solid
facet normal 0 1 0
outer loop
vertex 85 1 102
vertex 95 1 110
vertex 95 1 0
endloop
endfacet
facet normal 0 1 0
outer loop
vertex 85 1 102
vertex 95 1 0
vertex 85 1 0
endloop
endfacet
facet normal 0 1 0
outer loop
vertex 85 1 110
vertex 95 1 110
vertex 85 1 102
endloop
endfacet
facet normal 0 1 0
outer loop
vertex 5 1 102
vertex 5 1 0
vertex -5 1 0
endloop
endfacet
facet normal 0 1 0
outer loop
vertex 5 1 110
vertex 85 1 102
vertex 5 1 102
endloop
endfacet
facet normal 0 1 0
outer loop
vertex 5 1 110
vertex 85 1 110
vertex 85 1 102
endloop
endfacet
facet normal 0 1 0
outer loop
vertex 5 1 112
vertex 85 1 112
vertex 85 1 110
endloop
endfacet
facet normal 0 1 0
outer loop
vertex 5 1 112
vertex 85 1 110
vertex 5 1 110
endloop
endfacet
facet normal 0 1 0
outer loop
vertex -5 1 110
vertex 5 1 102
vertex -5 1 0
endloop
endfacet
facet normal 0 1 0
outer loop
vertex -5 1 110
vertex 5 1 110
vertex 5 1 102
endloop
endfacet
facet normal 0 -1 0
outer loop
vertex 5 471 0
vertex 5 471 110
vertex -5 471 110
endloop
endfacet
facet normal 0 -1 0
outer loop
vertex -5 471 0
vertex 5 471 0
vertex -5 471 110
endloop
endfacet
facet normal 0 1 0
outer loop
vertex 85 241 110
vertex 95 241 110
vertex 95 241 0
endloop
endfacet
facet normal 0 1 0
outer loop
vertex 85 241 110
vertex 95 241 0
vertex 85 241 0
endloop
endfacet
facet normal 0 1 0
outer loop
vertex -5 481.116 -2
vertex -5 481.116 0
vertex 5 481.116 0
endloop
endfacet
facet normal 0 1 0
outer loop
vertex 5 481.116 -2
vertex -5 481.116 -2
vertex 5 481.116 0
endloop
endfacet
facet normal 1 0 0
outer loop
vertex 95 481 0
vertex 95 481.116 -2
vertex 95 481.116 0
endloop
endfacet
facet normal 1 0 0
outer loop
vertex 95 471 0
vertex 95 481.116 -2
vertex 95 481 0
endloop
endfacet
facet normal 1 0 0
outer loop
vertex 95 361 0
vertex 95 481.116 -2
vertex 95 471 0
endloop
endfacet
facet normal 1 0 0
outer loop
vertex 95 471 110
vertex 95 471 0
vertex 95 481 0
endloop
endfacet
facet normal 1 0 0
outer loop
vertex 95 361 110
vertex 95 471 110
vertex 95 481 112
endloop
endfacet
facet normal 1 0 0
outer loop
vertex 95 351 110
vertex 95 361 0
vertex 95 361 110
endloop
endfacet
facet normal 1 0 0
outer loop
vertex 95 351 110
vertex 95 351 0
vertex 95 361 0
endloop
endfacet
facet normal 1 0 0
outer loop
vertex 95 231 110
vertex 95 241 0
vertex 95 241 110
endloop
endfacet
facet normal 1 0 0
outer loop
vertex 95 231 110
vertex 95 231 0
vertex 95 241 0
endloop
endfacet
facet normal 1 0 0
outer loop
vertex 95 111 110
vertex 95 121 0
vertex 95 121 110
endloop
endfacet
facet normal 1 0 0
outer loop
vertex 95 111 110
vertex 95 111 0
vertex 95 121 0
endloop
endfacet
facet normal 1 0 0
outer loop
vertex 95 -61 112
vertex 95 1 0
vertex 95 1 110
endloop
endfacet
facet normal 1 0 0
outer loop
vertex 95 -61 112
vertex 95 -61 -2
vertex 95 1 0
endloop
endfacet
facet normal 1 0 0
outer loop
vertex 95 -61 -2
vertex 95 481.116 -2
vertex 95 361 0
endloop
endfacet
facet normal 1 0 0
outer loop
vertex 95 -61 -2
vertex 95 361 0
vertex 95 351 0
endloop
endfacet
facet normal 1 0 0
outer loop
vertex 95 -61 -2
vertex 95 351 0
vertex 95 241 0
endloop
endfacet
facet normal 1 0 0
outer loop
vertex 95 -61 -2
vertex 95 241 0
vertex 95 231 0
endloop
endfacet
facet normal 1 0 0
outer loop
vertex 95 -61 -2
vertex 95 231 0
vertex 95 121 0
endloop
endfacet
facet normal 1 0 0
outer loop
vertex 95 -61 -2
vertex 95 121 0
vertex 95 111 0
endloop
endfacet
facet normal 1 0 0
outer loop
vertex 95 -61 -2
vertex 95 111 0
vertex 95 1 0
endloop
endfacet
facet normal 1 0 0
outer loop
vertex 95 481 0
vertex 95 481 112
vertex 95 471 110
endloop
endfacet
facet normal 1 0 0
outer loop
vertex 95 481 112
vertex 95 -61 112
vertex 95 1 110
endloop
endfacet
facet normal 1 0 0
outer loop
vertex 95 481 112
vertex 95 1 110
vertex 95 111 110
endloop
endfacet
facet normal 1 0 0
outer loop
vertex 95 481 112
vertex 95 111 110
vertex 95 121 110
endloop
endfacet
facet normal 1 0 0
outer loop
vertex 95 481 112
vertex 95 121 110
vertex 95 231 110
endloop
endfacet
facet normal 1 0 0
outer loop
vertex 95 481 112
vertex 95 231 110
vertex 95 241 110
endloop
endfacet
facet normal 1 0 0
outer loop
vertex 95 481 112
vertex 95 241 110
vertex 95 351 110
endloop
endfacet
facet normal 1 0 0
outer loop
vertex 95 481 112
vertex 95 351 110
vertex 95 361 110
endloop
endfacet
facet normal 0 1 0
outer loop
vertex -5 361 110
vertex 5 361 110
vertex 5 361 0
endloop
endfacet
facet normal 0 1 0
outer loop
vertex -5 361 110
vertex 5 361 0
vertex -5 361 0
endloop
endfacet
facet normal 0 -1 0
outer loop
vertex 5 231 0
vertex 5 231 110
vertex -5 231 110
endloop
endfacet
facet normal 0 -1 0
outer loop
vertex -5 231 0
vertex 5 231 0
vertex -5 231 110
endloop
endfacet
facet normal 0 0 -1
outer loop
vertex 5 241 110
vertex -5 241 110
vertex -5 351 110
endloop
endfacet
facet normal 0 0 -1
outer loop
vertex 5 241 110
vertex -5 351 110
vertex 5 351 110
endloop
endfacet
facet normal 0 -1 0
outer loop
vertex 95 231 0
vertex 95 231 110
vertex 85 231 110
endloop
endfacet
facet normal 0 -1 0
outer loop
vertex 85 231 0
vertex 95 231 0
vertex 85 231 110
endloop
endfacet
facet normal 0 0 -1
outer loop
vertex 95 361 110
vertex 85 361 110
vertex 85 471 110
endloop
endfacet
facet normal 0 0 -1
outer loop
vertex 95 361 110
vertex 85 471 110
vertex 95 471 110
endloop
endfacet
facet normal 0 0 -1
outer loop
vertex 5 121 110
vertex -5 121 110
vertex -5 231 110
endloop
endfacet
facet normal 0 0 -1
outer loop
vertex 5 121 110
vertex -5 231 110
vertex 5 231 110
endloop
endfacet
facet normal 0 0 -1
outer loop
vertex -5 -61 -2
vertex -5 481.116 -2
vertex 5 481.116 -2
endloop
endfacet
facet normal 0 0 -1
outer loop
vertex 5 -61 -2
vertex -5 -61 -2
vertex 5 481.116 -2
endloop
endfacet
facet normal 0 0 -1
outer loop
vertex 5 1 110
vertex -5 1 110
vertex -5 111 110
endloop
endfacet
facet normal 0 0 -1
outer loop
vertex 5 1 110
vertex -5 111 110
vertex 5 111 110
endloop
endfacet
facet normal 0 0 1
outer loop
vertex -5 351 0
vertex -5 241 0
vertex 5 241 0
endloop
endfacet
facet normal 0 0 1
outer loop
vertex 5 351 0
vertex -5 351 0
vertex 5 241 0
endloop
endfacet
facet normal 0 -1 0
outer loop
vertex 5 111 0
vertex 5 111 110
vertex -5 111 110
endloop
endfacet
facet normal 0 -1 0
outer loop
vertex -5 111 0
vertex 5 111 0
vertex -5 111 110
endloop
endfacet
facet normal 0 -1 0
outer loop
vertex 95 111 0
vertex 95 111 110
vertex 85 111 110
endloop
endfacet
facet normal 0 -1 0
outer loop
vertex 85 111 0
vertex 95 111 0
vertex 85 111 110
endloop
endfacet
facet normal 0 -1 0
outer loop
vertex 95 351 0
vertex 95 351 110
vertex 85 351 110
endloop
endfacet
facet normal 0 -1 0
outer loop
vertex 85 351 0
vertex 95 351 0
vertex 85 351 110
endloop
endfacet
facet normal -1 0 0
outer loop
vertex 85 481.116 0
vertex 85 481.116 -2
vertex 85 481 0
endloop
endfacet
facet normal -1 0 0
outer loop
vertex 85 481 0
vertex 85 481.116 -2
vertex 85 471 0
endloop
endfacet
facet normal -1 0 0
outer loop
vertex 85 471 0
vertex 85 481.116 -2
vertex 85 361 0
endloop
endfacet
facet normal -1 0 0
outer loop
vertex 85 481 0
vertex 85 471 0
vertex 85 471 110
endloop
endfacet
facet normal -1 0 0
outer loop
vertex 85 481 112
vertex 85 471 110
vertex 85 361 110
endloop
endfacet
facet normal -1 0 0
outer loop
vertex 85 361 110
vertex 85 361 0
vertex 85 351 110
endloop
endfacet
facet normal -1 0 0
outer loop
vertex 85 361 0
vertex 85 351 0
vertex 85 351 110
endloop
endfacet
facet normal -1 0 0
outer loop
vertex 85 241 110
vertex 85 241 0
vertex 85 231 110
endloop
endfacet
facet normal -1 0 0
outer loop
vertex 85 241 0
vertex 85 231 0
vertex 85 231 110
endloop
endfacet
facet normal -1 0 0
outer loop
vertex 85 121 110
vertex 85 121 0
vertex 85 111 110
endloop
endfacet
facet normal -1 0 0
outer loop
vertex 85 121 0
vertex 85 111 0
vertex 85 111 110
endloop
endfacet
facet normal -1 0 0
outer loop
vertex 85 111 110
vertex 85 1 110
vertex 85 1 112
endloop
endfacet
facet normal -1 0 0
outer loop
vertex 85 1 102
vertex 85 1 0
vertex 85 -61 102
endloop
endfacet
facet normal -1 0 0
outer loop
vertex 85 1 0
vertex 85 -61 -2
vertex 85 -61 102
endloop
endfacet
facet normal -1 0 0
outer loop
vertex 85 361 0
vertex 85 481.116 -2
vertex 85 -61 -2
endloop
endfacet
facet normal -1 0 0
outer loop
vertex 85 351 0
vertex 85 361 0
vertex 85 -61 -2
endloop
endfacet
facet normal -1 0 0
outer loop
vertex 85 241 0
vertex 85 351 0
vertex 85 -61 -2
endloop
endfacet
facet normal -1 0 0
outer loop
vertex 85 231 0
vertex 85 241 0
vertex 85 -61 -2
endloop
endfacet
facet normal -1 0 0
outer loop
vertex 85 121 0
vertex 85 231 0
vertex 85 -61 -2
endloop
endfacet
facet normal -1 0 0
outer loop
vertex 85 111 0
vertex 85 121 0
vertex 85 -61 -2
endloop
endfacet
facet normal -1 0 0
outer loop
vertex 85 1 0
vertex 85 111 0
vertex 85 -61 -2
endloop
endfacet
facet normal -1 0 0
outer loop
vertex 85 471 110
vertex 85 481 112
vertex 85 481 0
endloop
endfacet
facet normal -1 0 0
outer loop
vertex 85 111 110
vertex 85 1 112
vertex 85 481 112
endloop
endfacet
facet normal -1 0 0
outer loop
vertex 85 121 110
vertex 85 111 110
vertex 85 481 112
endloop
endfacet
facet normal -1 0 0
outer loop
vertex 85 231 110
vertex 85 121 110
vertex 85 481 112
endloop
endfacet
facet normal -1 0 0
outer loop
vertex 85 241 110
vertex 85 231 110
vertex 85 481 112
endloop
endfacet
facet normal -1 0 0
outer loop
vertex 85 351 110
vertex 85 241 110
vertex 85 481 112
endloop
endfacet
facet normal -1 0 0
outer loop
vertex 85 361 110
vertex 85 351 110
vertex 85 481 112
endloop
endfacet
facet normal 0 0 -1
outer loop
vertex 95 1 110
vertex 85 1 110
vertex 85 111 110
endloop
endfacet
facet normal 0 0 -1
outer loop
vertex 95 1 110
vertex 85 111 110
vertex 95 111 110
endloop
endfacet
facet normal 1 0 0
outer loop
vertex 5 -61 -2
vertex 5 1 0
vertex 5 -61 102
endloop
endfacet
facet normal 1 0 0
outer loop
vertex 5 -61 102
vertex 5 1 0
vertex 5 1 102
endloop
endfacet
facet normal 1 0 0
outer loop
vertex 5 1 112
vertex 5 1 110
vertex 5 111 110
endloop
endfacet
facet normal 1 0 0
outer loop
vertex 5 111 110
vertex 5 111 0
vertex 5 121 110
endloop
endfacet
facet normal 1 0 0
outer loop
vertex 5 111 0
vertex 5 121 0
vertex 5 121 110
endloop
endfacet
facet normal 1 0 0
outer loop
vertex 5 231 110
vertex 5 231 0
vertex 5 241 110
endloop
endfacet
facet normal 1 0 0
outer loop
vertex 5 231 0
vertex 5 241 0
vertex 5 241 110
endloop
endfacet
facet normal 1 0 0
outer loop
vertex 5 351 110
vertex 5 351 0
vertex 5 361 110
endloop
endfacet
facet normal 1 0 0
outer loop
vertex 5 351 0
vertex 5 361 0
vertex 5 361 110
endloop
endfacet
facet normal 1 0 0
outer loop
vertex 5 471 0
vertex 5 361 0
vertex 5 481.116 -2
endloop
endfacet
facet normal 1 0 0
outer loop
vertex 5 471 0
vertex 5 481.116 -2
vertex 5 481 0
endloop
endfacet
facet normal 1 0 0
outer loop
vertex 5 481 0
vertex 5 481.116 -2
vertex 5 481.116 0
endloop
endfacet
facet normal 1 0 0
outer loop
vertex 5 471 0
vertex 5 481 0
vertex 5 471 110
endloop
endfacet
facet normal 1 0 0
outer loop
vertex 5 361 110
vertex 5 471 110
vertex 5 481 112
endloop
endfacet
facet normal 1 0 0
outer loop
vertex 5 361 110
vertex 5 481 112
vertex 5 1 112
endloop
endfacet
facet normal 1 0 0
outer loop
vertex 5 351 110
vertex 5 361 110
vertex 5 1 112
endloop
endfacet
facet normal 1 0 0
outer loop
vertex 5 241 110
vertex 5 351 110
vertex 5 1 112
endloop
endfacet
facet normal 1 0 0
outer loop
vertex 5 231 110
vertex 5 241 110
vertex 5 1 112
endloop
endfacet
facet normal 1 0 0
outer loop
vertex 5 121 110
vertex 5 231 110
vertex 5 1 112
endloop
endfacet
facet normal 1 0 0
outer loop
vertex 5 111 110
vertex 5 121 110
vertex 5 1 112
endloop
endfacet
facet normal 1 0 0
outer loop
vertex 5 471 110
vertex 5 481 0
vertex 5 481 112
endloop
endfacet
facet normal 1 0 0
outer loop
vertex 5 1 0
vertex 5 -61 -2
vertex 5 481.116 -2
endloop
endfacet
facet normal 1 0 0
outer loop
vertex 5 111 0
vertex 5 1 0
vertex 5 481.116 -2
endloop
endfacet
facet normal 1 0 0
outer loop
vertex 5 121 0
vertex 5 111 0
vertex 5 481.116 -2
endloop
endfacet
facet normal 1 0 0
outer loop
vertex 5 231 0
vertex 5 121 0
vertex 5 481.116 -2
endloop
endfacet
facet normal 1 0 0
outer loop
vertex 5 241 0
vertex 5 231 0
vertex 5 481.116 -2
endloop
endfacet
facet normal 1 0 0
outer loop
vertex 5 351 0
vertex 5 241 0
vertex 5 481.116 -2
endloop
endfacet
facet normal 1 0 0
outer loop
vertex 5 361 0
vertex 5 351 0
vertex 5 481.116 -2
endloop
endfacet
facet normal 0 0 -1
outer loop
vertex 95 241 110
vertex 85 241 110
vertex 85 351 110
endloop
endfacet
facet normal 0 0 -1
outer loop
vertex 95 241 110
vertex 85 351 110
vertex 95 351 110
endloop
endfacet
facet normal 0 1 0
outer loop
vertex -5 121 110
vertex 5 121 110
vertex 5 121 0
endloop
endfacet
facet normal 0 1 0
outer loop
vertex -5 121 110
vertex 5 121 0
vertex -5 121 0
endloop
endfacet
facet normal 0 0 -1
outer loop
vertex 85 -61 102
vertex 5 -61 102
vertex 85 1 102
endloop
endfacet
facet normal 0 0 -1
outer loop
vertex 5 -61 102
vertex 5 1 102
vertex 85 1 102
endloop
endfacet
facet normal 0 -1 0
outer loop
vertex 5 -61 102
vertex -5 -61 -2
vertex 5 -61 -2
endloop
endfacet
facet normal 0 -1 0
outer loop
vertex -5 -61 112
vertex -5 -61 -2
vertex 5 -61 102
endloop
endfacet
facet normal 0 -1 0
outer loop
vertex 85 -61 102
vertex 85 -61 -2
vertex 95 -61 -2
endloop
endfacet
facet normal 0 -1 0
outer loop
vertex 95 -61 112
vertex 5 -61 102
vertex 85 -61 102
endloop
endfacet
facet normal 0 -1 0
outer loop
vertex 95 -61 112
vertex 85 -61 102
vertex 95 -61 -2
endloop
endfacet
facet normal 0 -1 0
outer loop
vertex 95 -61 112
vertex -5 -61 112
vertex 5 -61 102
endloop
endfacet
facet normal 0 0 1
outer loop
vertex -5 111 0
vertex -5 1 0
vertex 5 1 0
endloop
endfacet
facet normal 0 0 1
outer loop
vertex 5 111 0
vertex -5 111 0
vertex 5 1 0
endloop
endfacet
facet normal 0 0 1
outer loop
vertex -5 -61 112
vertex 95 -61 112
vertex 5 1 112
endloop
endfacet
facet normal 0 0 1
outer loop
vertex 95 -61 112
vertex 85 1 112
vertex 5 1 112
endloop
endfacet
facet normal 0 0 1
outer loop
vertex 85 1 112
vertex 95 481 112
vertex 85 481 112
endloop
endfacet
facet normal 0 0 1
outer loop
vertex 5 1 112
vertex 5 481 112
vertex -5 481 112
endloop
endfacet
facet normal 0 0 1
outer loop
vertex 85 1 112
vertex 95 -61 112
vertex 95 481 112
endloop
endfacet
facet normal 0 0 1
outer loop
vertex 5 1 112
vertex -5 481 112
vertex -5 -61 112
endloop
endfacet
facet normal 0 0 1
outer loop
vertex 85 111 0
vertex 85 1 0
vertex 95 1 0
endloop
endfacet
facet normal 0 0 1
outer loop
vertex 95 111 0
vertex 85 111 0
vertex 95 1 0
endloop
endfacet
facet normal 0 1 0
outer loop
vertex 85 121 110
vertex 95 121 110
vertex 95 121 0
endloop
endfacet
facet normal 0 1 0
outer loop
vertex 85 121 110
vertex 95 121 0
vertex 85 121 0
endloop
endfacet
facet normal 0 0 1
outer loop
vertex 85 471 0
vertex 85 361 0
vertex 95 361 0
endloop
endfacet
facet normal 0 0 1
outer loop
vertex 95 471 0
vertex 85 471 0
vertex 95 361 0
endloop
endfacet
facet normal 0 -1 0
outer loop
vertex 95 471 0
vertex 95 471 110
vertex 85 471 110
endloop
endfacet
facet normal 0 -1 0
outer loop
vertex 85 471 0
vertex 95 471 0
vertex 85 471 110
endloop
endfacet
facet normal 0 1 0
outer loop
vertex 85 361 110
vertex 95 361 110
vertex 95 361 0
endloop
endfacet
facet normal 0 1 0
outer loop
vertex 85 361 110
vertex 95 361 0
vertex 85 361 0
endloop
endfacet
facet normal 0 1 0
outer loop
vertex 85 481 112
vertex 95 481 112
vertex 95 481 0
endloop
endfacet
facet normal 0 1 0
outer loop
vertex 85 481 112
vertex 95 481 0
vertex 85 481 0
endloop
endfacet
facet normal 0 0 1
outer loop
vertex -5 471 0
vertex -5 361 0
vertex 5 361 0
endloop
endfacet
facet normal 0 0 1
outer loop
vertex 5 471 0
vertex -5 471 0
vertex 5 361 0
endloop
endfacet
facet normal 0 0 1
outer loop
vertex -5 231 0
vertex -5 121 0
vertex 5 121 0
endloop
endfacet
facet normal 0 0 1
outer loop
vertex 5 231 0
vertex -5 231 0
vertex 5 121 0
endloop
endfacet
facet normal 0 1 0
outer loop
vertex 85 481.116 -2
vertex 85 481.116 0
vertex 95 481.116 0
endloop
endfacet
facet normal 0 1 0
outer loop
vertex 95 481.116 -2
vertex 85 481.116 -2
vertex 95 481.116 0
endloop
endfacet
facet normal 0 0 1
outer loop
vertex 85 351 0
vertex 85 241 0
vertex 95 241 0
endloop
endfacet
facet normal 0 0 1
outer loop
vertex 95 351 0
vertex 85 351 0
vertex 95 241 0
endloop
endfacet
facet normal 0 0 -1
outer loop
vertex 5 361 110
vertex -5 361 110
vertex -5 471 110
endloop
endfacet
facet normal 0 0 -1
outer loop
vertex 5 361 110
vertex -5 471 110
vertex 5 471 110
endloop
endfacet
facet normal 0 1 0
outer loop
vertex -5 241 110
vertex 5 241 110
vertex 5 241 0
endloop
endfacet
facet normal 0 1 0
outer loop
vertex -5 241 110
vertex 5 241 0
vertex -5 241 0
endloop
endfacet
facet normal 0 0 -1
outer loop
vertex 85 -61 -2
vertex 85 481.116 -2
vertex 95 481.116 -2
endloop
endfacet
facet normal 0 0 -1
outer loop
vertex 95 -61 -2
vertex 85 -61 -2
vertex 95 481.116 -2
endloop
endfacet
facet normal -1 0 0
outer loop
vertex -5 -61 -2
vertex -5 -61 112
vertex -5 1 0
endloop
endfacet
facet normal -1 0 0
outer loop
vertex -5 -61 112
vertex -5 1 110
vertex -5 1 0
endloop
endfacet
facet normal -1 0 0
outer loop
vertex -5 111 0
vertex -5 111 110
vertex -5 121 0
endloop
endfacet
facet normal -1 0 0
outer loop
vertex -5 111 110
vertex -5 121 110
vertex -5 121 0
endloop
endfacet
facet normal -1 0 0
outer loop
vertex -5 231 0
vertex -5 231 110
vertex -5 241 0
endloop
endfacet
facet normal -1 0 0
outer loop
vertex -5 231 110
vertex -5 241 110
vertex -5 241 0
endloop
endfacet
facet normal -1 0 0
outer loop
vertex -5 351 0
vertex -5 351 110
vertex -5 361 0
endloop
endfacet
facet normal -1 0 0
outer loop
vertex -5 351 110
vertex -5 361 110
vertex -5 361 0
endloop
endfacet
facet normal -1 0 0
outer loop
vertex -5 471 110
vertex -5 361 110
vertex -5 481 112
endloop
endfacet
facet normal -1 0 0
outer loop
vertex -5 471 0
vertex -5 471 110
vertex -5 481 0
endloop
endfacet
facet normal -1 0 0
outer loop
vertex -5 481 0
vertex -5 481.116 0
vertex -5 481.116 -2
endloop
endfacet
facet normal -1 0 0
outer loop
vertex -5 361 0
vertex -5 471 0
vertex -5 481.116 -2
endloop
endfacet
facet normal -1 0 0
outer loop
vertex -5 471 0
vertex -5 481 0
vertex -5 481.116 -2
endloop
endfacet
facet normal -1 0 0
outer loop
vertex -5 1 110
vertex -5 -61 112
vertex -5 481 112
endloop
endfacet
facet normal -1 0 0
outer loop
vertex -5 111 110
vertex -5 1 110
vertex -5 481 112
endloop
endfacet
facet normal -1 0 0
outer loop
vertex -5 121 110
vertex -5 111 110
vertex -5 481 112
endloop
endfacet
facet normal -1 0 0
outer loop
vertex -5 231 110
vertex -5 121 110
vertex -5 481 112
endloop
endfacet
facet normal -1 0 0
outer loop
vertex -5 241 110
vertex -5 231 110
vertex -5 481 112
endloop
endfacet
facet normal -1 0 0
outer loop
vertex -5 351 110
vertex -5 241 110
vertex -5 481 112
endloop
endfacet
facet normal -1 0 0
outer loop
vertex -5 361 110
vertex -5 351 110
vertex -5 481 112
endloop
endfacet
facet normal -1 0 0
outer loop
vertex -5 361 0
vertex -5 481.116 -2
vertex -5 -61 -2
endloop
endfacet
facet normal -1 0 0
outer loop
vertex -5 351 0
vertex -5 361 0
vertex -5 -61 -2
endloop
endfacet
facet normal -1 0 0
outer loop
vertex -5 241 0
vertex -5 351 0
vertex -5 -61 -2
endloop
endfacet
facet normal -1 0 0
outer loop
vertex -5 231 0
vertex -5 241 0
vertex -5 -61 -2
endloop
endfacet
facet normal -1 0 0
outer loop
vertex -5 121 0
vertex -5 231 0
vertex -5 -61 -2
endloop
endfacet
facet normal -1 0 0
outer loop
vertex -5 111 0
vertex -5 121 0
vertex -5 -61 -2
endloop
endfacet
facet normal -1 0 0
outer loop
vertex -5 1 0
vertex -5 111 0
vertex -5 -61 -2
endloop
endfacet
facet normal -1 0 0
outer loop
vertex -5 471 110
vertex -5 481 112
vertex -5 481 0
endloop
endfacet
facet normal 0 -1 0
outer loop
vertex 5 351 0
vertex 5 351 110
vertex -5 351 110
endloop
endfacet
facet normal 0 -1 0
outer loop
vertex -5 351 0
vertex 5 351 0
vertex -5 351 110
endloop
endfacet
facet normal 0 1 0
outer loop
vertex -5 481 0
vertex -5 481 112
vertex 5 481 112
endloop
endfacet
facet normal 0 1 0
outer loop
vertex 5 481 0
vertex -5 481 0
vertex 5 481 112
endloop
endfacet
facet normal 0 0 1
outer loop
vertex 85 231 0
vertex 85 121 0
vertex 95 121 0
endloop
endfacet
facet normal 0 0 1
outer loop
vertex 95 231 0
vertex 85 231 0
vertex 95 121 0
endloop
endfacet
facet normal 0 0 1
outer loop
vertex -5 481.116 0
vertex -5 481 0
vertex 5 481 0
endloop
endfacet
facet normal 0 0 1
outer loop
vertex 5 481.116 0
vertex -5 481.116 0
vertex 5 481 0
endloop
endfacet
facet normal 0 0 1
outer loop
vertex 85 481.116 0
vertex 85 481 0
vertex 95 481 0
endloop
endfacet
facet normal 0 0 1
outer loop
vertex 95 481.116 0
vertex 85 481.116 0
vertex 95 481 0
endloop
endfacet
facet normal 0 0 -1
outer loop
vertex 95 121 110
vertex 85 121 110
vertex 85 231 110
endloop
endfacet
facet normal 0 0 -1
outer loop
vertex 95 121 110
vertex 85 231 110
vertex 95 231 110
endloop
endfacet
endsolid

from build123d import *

# Parameters (mm, degrees)
SKETCH1_W            = 10
SKETCH1_H            = 2
BOSS_EXTRUDE1_DEPTH  = 112
SKETCH2_W            = 10
SKETCH2_H            = 2
BOSS_EXTRUDE2_DEPTH  = 480
SKETCH3_W            = 10
SKETCH3_H            = 2
BOSS_EXTRUDE3_DEPTH  = 90
SKETCH4_W            = 10
SKETCH4_H            = 2
BOSS_EXTRUDE4_DEPTH  = 102
SKETCH5_W            = 10
SKETCH5_H            = 2
BOSS_EXTRUDE5_DEPTH  = 480
SKETCH6_W            = 10
SKETCH6_H            = 10
BOSS_EXTRUDE6_DEPTH  = 110
SKETCH7_W            = 10
SKETCH7_H            = 10
BOSS_EXTRUDE7_DEPTH  = 110
SKETCH8_W            = 10
SKETCH8_H            = 10
BOSS_EXTRUDE8_DEPTH  = 110
SKETCH9_W            = 10
SKETCH9_H            = 10
BOSS_EXTRUDE9_DEPTH  = 110
BOSS_EXTRUDE10_DEPTH = 60
SKETCH12_W           = 10
SKETCH12_H           = 2
BOSS_EXTRUDE11_DEPTH = 542.116195333


with BuildPart() as part:
    # Sketch1 → Boss-Extrude1 (new body)
    with BuildSketch(Plane.XY):
        Rectangle(SKETCH1_W, SKETCH1_H)
    extrude(amount=BOSS_EXTRUDE1_DEPTH)

    # Sketch2 → Boss-Extrude2 (add)
    with BuildSketch(Plane(origin=(0, 1, 0), x_dir=(1, 0, 0), z_dir=(0, 1, 0))):
        with Locations((0, -111)):
            Rectangle(SKETCH2_W, SKETCH2_H)
    extrude(amount=BOSS_EXTRUDE2_DEPTH)

    # Sketch3 → Boss-Extrude3 (add)
    with BuildSketch(Plane(origin=(5, 0, 0), x_dir=(0, 0, -1), z_dir=(1, 0, 0))):
        with Locations((-107, 0)):
            Rectangle(SKETCH3_W, SKETCH3_H)
    extrude(amount=BOSS_EXTRUDE3_DEPTH)

    # Sketch4 → Boss-Extrude4 (add)
    with BuildSketch(Plane(origin=(0, 0, 102), x_dir=(-1, 0, 0), z_dir=(0, 0, -1))):
        with Locations((-90, 0)):
            Rectangle(SKETCH4_W, SKETCH4_H)
    extrude(amount=BOSS_EXTRUDE4_DEPTH)

    # Sketch5 → Boss-Extrude5 (add)
    with BuildSketch(Plane(origin=(0, 1, 0), x_dir=(1, 0, 0), z_dir=(0, 1, 0))):
        with Locations((90, -111)):
            Rectangle(SKETCH5_W, SKETCH5_H)
    extrude(amount=BOSS_EXTRUDE5_DEPTH)

    # Sketch6 → Boss-Extrude6 (add)
    with BuildSketch(Plane(origin=(0, 0, 110), x_dir=(-1, 0, 0), z_dir=(0, 0, -1))):
        with Locations((-90, 116)):
            Rectangle(SKETCH6_W, SKETCH6_H)
        with Locations((0, 116)):
            Rectangle(SKETCH6_W, SKETCH6_H)
    extrude(amount=BOSS_EXTRUDE6_DEPTH)

    # Sketch7 → Boss-Extrude7 (add)
    with BuildSketch(Plane(origin=(0, 0, 110), x_dir=(-1, 0, 0), z_dir=(0, 0, -1))):
        with Locations((-90, 236)):
            Rectangle(SKETCH7_W, SKETCH7_H)
        with Locations((0, 236)):
            Rectangle(SKETCH7_W, SKETCH7_H)
    extrude(amount=BOSS_EXTRUDE7_DEPTH)

    # Sketch8 → Boss-Extrude8 (add)
    with BuildSketch(Plane(origin=(0, 0, 110), x_dir=(-1, 0, 0), z_dir=(0, 0, -1))):
        with Locations((-90, 356)):
            Rectangle(SKETCH8_W, SKETCH8_H)
        with Locations((0, 356)):
            Rectangle(SKETCH8_W, SKETCH8_H)
    extrude(amount=BOSS_EXTRUDE8_DEPTH)

    # Sketch9 → Boss-Extrude9 (add)
    with BuildSketch(Plane(origin=(0, 0, 110), x_dir=(-1, 0, 0), z_dir=(0, 0, -1))):
        with Locations((-90, 476)):
            Rectangle(SKETCH9_W, SKETCH9_H)
        with Locations((0, 476)):
            Rectangle(SKETCH9_W, SKETCH9_H)
    extrude(amount=BOSS_EXTRUDE9_DEPTH)

    # Sketch11 → Boss-Extrude10 (add)
    with BuildSketch(Plane.XZ.offset(1)):
        Polygon((-5, 112), (-5, 0), (5, 0), (5, 102), (85, 102), (85, 0), (95, 0), (95, 112), align=None)
    extrude(amount=BOSS_EXTRUDE10_DEPTH)

    # Sketch12 → Boss-Extrude11 (add)
    with BuildSketch(Plane.XZ.offset(61)):
        with Locations((90, -1)):
            Rectangle(SKETCH12_W, SKETCH12_H)
        with Locations((0, -1)):
            Rectangle(SKETCH12_W, SKETCH12_H)
    extrude(amount=-BOSS_EXTRUDE11_DEPTH)


solid = part.part
